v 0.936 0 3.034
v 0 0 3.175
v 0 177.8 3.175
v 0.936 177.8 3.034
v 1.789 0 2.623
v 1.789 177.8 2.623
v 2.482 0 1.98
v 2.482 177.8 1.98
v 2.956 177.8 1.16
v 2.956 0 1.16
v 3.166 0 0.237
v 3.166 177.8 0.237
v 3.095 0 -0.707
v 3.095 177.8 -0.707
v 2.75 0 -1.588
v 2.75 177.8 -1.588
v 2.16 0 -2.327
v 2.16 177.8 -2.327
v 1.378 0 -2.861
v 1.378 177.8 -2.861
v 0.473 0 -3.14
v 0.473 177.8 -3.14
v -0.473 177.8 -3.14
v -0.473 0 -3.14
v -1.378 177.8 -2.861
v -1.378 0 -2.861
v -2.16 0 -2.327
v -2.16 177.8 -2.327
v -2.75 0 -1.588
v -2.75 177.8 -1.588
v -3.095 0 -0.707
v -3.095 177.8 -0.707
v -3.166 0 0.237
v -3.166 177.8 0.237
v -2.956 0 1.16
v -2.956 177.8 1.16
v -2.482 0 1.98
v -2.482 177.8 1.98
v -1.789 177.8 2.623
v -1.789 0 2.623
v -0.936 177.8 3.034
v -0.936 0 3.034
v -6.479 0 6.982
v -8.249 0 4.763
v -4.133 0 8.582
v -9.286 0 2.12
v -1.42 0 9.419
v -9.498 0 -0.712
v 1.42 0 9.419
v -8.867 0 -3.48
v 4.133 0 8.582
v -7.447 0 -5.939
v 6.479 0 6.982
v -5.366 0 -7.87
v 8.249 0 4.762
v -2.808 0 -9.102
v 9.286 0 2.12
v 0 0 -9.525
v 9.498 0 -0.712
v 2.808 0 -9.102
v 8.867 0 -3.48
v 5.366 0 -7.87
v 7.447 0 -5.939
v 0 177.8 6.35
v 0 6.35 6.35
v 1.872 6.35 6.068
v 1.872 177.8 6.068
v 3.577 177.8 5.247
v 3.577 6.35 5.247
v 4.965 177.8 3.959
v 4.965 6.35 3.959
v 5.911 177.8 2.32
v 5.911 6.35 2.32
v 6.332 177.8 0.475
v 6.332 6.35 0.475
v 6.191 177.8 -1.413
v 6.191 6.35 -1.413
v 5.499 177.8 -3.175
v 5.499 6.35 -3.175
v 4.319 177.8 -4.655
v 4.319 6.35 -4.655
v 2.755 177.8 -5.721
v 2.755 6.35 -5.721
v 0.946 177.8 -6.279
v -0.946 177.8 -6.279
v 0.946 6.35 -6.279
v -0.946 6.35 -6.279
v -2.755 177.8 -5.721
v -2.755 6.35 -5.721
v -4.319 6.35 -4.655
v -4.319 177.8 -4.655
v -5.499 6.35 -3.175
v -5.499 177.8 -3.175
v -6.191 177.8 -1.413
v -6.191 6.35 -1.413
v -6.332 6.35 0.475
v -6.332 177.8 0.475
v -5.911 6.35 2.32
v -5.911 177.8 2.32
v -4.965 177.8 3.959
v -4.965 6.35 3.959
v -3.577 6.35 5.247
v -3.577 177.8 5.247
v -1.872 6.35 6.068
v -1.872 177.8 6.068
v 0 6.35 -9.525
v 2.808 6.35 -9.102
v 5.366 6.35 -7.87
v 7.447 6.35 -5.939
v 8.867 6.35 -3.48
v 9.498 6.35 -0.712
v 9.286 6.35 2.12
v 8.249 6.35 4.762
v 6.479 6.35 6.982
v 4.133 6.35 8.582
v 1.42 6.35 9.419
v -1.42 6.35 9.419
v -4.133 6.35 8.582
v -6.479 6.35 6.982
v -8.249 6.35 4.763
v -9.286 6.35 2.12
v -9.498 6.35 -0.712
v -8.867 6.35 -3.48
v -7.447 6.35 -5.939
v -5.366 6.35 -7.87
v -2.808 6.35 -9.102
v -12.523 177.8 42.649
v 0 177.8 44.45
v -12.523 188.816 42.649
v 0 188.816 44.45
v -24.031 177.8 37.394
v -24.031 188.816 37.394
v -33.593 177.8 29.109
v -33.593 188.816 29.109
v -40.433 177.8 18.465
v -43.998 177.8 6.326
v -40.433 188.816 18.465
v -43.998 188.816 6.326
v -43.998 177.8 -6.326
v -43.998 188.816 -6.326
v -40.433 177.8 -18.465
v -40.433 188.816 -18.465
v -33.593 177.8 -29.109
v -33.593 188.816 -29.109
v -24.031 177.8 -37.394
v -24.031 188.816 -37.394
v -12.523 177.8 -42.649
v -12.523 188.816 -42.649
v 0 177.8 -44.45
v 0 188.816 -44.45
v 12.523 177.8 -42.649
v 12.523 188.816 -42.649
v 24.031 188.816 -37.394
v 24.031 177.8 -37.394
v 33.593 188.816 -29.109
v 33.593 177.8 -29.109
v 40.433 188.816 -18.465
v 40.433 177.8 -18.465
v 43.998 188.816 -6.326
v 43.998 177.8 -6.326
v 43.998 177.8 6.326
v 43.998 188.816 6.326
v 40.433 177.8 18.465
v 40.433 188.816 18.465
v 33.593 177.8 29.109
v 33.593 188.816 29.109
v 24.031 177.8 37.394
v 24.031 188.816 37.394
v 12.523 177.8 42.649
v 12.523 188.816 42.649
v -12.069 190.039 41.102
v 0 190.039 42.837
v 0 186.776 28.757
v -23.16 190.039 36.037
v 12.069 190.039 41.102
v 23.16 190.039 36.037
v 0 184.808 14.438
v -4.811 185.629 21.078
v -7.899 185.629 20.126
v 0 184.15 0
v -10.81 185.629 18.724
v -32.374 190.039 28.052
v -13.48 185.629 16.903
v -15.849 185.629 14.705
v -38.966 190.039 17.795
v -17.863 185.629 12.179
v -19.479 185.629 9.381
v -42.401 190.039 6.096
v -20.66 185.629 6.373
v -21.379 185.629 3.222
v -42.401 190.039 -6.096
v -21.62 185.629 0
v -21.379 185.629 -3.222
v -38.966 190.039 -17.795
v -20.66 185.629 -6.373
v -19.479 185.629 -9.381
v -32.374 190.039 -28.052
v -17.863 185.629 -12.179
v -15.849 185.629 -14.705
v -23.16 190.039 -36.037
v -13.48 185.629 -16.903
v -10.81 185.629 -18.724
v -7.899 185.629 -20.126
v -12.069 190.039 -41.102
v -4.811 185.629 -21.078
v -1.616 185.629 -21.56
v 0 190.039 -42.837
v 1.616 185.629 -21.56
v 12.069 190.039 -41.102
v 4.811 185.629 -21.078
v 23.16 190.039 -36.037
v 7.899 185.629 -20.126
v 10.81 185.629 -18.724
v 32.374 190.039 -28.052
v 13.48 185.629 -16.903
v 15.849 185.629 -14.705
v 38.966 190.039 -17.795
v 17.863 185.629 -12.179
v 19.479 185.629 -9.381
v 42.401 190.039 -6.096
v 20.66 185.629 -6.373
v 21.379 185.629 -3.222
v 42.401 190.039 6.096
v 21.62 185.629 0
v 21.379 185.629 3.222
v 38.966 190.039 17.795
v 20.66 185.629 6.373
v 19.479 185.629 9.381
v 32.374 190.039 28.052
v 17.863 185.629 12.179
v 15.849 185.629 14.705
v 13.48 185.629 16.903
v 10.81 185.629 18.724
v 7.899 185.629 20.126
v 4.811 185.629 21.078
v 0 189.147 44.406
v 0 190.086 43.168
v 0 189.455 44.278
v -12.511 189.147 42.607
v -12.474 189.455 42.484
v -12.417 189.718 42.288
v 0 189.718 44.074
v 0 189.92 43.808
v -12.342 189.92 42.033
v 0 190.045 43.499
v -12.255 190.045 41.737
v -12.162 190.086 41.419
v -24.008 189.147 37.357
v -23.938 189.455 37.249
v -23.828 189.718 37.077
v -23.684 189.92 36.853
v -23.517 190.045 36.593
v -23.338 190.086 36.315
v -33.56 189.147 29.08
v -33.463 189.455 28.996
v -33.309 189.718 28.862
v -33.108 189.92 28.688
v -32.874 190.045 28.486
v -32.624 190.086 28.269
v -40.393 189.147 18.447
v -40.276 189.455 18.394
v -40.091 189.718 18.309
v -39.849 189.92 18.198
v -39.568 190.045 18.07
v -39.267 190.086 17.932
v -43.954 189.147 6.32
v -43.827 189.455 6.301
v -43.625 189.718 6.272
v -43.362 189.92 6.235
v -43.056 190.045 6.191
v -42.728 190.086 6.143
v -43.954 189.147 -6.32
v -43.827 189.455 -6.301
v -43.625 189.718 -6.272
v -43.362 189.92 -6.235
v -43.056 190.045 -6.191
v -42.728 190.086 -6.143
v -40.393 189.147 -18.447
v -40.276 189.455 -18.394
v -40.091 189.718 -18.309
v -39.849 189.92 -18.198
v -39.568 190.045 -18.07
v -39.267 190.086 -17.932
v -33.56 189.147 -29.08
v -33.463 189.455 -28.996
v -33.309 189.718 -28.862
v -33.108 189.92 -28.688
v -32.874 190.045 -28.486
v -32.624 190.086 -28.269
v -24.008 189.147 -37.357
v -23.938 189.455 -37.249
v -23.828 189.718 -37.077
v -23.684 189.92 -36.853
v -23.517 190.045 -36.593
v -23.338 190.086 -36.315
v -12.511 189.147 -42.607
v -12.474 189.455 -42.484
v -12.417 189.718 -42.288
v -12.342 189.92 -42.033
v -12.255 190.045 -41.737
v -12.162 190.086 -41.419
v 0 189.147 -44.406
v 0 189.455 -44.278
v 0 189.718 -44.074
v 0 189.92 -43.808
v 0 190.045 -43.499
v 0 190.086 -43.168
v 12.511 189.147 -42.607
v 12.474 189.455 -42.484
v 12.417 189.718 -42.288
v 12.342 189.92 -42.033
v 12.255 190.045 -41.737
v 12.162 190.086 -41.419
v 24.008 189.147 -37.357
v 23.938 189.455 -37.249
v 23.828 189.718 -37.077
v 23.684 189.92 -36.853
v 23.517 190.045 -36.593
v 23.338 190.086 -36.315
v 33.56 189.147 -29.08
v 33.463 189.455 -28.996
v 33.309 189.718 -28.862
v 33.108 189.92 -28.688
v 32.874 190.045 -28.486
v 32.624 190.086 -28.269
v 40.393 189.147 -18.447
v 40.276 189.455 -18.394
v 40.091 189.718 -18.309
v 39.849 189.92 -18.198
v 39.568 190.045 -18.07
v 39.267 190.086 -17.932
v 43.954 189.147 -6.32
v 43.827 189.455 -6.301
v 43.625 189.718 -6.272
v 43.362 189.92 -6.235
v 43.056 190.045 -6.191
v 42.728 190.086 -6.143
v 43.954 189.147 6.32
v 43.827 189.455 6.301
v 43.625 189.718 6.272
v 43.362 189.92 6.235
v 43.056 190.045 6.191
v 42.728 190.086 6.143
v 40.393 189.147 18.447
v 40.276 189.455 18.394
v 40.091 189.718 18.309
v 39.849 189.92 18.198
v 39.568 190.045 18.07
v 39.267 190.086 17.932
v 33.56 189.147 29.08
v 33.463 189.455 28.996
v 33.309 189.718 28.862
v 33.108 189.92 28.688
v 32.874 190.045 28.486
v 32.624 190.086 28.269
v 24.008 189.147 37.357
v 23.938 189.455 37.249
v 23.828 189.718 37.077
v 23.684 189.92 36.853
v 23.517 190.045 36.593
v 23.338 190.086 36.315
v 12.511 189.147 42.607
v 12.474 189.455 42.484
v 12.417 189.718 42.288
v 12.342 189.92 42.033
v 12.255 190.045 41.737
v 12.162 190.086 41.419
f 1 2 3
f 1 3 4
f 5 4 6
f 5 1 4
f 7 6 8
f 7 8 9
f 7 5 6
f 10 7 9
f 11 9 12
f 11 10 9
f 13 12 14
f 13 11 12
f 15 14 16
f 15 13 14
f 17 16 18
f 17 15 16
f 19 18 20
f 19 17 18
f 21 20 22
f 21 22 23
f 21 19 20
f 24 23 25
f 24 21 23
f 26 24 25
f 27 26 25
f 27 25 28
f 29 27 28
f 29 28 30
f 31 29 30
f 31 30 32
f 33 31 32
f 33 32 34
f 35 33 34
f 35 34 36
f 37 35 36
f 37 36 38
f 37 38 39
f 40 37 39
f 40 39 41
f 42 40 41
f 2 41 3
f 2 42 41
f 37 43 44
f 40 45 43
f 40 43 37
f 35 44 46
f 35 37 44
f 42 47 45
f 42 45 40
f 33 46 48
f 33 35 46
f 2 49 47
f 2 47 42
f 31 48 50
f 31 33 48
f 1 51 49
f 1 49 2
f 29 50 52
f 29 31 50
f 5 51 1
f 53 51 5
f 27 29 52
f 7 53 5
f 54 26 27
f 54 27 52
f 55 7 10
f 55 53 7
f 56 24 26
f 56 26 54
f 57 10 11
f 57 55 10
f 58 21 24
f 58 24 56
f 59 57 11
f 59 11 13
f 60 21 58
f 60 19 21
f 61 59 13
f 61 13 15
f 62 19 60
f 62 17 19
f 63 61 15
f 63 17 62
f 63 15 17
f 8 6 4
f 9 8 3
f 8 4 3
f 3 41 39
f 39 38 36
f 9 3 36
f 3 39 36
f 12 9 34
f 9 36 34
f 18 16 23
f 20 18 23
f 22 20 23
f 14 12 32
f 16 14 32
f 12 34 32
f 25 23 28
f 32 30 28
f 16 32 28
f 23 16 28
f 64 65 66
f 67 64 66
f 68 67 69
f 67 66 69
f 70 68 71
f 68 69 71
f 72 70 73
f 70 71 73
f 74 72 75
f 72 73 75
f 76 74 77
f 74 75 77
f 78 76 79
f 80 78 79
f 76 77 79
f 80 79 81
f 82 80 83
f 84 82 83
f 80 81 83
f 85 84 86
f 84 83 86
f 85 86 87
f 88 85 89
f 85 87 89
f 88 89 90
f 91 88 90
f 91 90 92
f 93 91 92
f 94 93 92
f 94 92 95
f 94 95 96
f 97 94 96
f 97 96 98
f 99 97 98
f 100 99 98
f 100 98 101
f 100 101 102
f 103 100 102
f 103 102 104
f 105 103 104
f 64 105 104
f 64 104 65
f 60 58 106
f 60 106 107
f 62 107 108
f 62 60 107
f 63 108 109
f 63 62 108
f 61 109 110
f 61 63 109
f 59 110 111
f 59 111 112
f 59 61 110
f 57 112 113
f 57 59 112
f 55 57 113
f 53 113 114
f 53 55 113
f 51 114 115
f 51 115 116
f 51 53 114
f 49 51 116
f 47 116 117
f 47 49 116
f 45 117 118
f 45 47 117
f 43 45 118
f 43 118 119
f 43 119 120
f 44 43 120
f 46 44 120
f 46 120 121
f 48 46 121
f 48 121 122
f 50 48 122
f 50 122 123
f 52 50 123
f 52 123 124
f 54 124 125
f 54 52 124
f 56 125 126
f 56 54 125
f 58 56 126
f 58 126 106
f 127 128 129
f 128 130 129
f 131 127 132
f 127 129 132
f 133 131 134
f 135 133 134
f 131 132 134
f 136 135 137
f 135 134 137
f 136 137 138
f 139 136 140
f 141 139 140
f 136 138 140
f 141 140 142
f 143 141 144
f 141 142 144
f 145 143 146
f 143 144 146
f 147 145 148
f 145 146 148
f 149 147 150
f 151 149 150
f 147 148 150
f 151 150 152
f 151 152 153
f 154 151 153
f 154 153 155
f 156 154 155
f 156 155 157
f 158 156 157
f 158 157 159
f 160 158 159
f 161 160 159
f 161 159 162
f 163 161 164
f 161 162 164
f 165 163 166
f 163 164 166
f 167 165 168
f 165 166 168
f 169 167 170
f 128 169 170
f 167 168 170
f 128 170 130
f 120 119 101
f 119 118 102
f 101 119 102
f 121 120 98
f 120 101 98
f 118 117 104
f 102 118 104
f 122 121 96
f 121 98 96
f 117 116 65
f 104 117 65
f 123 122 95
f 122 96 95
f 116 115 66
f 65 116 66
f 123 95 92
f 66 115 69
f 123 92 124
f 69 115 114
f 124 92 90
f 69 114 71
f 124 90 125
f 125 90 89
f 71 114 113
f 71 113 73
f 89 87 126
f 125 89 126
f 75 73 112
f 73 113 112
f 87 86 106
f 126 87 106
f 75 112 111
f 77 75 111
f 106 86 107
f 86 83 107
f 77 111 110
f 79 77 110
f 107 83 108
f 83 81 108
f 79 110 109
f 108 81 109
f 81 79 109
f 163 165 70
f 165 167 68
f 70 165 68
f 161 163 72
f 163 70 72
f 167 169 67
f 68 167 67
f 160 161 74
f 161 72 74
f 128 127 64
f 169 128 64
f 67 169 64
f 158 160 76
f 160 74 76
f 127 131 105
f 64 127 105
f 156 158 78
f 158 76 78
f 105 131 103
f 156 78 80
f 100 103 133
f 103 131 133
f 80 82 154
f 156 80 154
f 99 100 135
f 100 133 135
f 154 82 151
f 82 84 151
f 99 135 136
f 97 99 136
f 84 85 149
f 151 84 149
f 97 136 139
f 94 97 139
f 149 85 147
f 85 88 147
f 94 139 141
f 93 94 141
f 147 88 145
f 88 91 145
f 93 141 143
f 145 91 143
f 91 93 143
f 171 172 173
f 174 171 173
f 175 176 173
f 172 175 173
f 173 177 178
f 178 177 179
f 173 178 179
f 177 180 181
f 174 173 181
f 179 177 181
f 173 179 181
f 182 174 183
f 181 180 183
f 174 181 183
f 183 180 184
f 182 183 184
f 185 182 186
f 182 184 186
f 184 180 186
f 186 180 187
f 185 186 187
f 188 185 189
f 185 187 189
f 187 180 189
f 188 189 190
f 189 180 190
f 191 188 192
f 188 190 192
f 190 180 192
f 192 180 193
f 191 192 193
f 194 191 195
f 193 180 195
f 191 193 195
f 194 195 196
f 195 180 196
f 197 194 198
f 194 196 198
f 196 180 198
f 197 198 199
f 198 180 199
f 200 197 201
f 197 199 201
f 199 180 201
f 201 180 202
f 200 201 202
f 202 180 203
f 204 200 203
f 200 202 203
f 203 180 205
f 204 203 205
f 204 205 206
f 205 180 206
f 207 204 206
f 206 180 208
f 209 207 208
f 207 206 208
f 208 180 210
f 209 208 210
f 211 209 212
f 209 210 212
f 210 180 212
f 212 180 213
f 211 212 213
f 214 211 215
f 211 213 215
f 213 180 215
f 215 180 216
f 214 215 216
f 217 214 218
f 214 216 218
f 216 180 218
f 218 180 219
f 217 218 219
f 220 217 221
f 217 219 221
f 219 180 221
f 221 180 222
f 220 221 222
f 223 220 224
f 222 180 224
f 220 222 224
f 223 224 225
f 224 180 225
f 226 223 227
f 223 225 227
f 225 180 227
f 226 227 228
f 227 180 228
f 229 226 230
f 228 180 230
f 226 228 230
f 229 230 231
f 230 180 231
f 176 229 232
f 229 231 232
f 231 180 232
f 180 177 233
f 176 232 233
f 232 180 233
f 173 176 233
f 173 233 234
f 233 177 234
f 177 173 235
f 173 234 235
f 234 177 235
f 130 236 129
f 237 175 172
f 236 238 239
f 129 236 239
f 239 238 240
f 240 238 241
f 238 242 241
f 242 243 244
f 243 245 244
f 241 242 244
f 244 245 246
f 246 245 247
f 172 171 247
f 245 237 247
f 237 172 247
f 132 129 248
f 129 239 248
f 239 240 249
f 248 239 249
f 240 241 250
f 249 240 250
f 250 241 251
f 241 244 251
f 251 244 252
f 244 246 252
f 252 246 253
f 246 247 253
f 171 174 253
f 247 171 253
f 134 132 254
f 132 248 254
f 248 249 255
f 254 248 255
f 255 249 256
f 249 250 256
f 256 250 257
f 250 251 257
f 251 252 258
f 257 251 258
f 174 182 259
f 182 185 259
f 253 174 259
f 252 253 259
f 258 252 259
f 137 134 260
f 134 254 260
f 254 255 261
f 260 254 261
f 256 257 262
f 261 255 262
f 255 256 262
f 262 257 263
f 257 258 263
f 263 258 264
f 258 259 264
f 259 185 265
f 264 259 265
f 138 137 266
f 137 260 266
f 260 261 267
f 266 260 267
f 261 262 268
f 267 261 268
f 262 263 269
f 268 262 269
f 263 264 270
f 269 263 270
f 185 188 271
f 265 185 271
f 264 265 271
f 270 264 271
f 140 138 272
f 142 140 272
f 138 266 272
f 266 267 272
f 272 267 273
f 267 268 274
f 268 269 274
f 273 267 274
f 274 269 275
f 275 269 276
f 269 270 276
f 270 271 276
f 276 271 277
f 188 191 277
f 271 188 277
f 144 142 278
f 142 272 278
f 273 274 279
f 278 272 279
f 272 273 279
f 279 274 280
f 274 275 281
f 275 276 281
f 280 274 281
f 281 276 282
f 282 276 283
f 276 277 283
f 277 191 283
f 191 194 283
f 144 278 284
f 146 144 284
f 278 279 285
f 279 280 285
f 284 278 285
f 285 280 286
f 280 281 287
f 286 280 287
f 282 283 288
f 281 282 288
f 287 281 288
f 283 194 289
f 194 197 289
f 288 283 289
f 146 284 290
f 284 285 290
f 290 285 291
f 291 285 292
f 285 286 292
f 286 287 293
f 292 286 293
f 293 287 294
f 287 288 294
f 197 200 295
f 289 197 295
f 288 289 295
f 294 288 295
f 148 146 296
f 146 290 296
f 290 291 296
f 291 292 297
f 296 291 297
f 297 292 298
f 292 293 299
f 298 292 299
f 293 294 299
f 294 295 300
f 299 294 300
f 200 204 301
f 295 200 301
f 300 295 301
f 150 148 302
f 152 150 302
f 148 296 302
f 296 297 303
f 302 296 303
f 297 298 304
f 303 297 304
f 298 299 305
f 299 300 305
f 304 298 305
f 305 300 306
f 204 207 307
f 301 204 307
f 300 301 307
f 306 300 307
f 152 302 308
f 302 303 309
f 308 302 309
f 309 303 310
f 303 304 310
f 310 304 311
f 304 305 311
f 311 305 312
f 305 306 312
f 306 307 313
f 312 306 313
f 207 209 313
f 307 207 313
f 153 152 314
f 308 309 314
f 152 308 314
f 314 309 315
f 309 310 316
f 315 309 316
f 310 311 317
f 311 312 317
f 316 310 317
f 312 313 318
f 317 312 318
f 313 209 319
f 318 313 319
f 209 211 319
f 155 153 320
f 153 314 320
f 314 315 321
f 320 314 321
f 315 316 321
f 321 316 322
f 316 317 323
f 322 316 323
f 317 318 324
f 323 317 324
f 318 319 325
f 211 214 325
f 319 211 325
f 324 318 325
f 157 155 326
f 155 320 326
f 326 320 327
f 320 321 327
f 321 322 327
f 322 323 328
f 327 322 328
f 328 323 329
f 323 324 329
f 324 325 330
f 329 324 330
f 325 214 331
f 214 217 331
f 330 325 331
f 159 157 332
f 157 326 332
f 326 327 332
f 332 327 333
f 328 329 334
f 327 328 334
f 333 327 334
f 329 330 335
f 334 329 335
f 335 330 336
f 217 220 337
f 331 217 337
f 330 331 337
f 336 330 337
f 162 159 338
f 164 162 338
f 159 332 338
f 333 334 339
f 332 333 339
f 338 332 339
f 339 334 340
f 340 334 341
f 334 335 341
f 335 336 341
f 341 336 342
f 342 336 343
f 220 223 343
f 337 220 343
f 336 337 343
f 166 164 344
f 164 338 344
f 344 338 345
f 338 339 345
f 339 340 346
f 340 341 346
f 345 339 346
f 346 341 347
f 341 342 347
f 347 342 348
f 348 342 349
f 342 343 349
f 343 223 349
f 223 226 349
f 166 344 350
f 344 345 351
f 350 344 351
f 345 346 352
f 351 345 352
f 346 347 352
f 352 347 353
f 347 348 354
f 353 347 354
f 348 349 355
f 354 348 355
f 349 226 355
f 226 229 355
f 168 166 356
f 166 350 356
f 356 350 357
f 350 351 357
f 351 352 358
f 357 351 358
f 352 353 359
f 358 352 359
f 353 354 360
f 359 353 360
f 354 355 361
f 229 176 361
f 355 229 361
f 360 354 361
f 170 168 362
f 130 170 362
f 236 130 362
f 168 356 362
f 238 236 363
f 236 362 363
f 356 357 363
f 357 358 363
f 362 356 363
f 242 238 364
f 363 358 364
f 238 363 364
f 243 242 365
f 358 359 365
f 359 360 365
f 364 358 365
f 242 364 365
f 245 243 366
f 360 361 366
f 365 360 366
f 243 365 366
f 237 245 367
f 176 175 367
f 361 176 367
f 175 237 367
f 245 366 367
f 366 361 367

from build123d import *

# Parameters (mm, degrees)
SKETCH1_R           = 6.35
SKETCH1_R_2         = 3.175
BOSS_EXTRUDE1_DEPTH = 177.8
SKETCH7_R           = 9.525
SKETCH7_R_2         = 6.35
BOSS_EXTRUDE2_DEPTH = 6.35


with BuildPart() as part:
    # Sketch1 → Boss-Extrude1 (new body)
    with BuildSketch(Plane(origin=(0, 0, 0), x_dir=(1, 0, 0), z_dir=(0, 1, 0))):
        with Locations(Location((0, 0, 0), (0, 0, 270))):
            Circle(SKETCH1_R)
        with Locations(Location((0, 0, 0), (0, 0, 270))):
            Circle(SKETCH1_R_2, mode=Mode.SUBTRACT)
    extrude(amount=BOSS_EXTRUDE1_DEPTH)

    # Sketch6 → Revolve2 (revolve)
    with BuildSketch(Plane(origin=(0, 0, 0), x_dir=(0, 0, -1), z_dir=(1, 0, 0))):
        with BuildLine():
            Line((0, 177.8), (-44.45, 177.8))
            Line((-44.45, 177.8), (-44.45, 188.815970977))
            ThreePointArc((-44.45, 188.815970977), (-43.947356832, 189.827931199), (-42.837301587, 190.038860096))
            ThreePointArc((-42.837301587, 190.038860096), (-21.620089503, 185.629105586), (0, 184.15))
            Line((0, 184.15), (0, 177.8))
        make_face()
    revolve(axis=Axis((0, 184.15, 0), (0, -1, 0)))

    # Sketch7 → Boss-Extrude2 (add)
    with BuildSketch(Plane.XZ):
        with Locations(Location((0, 0, 0), (0, 0, 270))):
            Circle(SKETCH7_R)
        with Locations(Location((0, 0, 0), (0, 0, 270))):
            Circle(SKETCH7_R_2, mode=Mode.SUBTRACT)
    extrude(amount=-BOSS_EXTRUDE2_DEPTH)


solid = part.part
